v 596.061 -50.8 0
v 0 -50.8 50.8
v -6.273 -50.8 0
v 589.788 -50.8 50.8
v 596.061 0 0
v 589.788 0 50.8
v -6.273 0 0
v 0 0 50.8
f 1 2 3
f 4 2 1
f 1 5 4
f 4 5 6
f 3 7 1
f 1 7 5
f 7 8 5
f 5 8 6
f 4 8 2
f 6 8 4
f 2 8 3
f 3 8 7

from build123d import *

# Parameters (mm, degrees)
F0_W     = 589.788
F0_H     = 50.8
F1_DEPTH = 50.8
F2_DEPTH = 50.8
F3_DEPTH = 50.8


with BuildPart() as f1:
    # F0 (on Front) → F1 (new body)
    with BuildSketch(Plane.XZ):
        with Locations((294.894, 25.4)):
            Rectangle(F0_W, F0_H)
    extrude(amount=F1_DEPTH)

    # F0 (on Front) → F2 (join)
    with BuildSketch(Plane.XZ):
        Polygon((589.788, 50.8), (589.788, 0), (596.061459, 0), align=None)
    extrude(amount=F2_DEPTH)

    # F0 (on Front) → F3 (join)
    with BuildSketch(Plane.XZ):
        Polygon((-6.273459, 0), (0, 0), (0, 50.8), align=None)
    extrude(amount=F3_DEPTH)


solid = f1.part
